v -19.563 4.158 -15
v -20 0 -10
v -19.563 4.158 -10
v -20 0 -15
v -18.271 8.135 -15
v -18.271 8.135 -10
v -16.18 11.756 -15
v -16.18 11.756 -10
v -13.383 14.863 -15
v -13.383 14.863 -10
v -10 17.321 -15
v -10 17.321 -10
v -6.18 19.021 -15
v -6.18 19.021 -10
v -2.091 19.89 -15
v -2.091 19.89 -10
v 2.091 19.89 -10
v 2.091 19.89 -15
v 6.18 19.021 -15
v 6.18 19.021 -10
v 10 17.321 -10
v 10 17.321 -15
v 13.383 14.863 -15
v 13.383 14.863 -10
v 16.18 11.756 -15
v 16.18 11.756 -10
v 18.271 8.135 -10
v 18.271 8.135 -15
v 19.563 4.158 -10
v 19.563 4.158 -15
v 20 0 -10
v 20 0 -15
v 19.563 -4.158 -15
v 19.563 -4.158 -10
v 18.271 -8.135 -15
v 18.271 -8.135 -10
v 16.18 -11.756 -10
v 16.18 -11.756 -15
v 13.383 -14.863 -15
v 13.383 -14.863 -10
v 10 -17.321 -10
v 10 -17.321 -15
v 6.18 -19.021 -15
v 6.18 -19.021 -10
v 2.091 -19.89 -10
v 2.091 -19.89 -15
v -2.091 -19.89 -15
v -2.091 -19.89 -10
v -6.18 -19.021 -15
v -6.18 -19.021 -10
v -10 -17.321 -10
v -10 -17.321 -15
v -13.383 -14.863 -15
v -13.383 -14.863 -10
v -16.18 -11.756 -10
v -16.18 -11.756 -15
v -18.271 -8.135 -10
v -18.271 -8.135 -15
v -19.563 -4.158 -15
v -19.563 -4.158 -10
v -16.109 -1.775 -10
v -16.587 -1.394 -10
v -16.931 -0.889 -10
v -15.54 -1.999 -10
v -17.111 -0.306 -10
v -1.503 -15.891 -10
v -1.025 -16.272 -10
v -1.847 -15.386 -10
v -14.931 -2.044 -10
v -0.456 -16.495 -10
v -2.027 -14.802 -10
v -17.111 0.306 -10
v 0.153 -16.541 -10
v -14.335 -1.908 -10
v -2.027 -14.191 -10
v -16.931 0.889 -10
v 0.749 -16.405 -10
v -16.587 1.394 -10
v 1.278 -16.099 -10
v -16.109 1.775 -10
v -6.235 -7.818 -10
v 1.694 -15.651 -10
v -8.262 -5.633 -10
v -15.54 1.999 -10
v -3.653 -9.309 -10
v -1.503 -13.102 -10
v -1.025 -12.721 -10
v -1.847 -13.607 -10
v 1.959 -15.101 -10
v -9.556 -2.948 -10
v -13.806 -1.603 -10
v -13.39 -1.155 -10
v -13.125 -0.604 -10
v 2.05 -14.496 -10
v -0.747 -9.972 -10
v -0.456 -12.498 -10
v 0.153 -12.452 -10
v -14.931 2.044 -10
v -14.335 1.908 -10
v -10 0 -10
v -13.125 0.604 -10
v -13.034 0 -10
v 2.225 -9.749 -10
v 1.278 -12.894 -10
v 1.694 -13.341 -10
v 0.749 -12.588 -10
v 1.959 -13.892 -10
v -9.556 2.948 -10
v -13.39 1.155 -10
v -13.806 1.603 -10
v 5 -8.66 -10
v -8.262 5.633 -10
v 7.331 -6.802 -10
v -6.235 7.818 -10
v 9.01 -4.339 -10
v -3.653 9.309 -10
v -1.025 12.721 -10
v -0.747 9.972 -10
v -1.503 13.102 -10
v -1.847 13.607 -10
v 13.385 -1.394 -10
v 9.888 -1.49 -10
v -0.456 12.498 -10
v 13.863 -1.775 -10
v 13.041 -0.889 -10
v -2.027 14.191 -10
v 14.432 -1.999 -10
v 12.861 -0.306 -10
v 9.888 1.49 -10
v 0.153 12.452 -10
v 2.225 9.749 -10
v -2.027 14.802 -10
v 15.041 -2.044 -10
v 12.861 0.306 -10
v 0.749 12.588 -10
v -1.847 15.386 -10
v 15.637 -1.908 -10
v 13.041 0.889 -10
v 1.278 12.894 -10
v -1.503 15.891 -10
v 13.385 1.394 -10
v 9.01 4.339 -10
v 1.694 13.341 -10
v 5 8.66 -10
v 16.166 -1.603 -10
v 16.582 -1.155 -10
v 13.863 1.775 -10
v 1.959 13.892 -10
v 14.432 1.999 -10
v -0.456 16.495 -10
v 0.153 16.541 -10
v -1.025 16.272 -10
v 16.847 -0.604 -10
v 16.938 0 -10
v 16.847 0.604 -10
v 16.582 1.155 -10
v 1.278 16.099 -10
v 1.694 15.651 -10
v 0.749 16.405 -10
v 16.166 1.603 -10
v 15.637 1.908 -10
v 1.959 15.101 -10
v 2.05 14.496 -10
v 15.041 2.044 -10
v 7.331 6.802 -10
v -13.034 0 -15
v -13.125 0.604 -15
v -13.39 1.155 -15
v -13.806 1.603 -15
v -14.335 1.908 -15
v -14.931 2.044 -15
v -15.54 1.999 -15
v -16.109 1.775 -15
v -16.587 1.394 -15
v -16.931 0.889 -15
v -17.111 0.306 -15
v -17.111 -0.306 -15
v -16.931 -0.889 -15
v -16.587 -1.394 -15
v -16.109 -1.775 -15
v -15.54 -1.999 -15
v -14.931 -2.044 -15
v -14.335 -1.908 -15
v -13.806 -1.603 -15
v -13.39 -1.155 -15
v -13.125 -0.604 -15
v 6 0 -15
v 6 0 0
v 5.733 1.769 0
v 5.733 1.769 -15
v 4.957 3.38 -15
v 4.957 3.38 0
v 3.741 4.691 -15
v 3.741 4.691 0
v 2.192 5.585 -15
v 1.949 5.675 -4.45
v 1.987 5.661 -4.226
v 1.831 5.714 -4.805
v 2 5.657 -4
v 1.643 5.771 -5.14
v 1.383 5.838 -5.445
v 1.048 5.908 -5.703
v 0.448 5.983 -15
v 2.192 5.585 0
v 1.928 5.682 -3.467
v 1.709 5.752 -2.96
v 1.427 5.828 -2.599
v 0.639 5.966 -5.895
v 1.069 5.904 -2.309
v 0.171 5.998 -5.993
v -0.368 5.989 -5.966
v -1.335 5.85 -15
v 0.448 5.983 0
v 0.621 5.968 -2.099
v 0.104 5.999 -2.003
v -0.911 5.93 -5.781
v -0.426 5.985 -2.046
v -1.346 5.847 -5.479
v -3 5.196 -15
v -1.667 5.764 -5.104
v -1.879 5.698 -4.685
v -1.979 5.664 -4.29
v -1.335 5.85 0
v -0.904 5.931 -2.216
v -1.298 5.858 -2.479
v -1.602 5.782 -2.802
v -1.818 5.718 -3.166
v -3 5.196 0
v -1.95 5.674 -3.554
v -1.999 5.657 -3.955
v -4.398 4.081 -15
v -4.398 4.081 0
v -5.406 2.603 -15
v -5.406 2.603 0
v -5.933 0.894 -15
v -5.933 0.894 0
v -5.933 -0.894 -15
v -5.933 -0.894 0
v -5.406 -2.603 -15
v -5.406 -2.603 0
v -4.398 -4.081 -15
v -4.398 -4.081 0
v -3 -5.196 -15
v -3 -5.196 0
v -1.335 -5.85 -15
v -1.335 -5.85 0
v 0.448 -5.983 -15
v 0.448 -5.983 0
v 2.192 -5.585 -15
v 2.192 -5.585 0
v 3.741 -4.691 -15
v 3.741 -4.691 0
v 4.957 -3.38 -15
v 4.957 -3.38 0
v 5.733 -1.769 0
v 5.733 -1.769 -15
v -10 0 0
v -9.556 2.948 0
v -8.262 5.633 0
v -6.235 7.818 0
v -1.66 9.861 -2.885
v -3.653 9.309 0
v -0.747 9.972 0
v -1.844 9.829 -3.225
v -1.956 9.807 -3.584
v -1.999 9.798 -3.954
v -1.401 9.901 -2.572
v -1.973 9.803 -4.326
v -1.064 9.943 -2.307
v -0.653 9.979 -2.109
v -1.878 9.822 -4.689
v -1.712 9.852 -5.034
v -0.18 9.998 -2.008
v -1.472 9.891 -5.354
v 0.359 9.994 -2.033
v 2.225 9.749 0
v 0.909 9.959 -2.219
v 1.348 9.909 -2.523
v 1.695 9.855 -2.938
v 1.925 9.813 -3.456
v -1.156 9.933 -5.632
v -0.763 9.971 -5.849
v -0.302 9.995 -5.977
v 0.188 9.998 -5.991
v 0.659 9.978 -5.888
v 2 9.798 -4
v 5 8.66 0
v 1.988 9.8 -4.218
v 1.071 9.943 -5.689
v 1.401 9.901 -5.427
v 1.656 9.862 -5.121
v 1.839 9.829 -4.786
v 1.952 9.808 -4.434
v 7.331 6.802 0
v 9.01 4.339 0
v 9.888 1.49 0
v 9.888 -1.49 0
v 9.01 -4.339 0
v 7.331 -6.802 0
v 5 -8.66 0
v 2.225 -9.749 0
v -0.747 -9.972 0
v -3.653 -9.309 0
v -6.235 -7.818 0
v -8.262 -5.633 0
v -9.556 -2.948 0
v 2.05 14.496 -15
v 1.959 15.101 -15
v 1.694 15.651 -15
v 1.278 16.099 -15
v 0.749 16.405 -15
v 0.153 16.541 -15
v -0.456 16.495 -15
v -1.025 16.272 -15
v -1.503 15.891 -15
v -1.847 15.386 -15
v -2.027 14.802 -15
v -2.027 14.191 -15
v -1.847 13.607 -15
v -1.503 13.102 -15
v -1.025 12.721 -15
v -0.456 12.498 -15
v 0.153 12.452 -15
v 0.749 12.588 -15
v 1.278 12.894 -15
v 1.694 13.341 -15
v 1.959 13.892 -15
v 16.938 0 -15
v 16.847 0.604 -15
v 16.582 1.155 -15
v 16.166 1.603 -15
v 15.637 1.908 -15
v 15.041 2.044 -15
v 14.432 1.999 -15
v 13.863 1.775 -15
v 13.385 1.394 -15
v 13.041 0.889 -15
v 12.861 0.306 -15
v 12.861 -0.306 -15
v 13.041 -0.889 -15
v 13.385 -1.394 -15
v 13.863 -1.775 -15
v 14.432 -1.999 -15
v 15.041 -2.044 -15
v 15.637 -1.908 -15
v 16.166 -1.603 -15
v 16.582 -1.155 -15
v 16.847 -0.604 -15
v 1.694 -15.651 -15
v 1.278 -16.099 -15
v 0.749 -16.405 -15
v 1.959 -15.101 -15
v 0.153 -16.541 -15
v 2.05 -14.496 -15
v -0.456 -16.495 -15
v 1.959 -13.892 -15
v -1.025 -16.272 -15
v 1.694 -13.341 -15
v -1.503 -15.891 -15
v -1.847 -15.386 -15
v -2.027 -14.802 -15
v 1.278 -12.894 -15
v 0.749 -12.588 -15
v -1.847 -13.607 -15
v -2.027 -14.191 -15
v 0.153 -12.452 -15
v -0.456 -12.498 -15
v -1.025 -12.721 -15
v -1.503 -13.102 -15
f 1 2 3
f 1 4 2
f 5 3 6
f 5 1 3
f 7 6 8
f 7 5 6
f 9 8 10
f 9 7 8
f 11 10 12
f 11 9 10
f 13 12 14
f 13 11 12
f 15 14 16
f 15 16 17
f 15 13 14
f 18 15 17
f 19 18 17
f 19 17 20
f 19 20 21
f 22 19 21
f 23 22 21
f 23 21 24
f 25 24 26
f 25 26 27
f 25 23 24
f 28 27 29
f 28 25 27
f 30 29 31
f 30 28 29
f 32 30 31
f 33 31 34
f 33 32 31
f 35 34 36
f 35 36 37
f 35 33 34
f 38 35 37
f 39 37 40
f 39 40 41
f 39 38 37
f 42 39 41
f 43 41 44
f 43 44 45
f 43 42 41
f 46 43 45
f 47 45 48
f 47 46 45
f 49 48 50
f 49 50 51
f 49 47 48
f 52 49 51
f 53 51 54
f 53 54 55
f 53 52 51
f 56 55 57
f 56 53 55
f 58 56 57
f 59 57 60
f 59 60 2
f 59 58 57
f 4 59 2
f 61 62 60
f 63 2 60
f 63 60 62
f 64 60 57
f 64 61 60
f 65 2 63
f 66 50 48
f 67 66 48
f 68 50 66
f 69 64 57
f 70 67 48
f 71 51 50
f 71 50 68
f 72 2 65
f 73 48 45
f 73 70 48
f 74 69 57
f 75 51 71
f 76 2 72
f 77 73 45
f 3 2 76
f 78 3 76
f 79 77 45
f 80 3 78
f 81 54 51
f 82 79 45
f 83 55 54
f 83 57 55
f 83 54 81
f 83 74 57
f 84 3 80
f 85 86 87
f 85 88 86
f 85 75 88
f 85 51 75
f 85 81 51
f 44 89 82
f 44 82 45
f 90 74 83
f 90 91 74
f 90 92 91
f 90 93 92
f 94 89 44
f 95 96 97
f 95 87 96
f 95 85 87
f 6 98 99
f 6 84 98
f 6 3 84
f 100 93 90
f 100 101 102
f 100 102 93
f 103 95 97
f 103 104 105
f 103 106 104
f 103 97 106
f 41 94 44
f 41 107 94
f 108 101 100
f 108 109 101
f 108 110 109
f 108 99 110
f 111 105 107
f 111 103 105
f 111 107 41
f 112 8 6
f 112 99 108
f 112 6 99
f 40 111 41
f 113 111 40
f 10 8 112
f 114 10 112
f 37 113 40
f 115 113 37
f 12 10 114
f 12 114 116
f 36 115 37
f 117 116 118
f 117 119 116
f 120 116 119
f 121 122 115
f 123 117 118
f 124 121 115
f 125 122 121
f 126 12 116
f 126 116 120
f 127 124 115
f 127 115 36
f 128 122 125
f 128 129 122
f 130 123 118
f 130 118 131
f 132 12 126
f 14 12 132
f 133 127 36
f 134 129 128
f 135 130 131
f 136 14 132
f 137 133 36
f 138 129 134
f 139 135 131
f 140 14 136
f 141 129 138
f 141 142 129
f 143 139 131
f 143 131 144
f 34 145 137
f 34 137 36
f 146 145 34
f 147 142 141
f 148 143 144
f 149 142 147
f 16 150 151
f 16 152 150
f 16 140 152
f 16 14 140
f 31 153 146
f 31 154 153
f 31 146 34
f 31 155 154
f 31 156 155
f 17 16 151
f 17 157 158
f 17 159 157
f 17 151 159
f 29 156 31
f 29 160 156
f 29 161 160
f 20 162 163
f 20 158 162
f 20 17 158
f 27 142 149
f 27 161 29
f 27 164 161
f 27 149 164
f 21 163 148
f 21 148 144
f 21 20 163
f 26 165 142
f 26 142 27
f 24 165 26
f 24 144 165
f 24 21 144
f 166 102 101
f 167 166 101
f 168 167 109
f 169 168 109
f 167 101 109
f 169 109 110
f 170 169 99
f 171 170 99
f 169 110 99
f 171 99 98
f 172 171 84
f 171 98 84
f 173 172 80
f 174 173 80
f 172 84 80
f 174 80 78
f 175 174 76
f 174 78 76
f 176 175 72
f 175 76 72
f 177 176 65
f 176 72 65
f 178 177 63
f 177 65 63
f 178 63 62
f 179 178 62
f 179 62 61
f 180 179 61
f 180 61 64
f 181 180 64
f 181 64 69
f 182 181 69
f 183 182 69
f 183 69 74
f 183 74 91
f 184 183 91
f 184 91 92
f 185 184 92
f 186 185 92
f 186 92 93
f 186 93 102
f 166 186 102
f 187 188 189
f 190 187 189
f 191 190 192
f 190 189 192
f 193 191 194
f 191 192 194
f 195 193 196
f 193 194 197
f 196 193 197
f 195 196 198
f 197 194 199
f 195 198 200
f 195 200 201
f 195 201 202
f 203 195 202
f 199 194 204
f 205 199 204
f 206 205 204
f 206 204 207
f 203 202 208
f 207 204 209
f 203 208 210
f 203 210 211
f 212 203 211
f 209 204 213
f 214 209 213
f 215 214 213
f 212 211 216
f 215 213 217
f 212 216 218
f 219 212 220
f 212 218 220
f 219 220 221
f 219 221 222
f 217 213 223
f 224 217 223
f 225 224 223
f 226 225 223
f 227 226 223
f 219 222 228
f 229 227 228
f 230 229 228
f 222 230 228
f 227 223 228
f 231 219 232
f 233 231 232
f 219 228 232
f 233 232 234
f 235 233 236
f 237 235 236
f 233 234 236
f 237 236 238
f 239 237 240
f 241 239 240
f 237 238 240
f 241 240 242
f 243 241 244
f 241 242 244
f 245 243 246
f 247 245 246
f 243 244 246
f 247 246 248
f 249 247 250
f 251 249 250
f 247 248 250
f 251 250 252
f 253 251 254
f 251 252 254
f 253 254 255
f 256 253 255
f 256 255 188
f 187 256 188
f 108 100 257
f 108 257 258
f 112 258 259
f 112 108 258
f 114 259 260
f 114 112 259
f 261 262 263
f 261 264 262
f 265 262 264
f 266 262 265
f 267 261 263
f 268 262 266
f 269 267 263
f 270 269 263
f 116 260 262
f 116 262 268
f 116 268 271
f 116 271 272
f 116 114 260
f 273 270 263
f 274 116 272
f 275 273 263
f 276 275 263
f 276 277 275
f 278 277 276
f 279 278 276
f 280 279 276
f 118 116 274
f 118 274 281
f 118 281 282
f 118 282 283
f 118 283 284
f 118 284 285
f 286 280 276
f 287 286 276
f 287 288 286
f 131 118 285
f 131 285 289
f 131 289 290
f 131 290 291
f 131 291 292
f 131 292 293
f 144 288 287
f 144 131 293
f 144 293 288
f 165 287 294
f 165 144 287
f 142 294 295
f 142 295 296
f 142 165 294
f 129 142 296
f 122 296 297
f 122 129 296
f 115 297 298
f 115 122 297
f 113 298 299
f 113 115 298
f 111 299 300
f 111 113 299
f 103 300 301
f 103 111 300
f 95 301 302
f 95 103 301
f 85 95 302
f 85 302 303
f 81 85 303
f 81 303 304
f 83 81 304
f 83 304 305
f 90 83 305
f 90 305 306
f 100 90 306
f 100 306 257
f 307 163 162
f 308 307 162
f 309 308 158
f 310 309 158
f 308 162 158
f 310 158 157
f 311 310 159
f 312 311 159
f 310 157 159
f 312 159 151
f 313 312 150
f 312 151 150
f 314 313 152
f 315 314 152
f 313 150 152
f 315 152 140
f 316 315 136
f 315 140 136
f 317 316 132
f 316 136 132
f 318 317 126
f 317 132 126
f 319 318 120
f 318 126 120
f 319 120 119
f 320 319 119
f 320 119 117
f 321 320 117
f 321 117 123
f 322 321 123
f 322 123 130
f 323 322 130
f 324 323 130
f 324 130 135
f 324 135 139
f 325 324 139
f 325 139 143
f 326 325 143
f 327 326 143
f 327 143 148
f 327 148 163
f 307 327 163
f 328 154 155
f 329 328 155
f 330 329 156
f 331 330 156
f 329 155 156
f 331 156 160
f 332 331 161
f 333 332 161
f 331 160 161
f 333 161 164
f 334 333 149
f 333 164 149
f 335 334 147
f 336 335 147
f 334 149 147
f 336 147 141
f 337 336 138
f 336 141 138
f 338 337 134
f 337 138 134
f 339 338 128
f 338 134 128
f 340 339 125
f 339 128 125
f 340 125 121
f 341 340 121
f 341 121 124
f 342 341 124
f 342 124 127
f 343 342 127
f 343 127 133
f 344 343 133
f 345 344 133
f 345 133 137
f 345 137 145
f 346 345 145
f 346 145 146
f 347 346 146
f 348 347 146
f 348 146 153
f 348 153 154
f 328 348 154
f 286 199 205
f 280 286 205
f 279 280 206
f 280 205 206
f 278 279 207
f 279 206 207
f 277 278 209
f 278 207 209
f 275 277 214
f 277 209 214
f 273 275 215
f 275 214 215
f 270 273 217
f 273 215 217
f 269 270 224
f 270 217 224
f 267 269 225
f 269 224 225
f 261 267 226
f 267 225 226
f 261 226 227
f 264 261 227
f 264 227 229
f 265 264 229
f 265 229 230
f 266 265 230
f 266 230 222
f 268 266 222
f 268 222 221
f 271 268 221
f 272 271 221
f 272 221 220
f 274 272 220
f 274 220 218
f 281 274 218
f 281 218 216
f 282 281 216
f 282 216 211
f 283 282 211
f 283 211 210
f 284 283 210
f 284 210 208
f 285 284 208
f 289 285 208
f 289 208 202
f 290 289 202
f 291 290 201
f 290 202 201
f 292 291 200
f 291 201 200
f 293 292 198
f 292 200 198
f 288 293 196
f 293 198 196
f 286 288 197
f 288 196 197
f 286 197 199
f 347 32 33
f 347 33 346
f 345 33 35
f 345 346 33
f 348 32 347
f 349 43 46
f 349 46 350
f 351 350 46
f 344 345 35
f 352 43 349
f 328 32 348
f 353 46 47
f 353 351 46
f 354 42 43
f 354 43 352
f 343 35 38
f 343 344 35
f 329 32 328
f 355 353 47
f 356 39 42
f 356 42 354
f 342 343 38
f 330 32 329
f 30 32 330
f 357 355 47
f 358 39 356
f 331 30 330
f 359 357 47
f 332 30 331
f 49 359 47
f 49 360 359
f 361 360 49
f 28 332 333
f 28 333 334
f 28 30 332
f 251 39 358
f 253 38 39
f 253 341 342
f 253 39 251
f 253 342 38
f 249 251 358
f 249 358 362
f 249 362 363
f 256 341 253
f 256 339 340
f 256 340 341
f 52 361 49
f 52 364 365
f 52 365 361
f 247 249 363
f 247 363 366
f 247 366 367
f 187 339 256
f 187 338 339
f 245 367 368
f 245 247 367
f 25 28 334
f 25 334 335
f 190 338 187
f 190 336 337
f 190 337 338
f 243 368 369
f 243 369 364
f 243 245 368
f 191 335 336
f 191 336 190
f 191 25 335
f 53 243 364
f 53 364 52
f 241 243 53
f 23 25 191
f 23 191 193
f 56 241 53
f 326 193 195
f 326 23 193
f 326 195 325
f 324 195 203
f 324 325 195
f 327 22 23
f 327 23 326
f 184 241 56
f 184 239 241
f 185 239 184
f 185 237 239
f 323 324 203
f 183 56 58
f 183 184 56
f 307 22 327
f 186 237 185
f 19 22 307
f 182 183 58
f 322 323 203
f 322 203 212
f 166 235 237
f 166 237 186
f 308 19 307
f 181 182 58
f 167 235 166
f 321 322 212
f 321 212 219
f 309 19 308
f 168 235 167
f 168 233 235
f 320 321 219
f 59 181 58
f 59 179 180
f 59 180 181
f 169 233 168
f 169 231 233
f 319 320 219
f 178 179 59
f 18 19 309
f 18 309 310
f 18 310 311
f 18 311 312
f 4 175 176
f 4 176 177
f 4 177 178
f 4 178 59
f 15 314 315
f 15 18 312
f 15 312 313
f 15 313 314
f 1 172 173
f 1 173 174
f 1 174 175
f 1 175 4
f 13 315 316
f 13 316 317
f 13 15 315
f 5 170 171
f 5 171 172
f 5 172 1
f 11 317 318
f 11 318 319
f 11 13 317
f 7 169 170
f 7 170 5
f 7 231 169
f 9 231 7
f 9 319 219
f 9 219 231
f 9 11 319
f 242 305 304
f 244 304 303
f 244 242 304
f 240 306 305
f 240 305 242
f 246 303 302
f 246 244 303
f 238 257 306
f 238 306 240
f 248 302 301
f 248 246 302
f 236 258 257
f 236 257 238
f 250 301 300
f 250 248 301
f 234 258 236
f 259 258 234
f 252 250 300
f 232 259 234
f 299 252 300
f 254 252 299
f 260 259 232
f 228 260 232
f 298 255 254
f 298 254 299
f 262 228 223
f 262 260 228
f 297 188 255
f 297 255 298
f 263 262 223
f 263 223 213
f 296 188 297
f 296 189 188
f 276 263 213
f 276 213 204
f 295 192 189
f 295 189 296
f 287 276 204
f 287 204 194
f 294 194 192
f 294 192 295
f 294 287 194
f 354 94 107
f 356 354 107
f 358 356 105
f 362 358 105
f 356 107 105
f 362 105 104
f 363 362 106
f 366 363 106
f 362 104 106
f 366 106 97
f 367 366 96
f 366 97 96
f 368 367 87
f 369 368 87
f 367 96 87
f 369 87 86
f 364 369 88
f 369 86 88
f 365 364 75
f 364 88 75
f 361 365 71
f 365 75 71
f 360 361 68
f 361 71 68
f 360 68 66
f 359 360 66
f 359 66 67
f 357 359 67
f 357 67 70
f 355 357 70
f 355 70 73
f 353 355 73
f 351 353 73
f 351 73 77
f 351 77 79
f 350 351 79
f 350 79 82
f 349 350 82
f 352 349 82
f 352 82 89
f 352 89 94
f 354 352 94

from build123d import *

# Parameters (mm, degrees)
F2_R     = 6
F3_DEPTH = 45
F4_R     = 2.05
F5_DEPTH = 25
F6_R     = 2
F7_DEPTH = 10


with BuildPart() as f1:
    # F0 (on Front) → F1 (revolve)
    with BuildSketch(Plane.XZ):
        Polygon((0, -15), (0, 0), (-10, 0), (-10, -10), (-20, -10), (-20, -15), align=None)
    revolve(axis=Axis((0, 0, -7.5), (0, 0, -1)))

    # F2 (on face) → F3 (cut)
    with BuildSketch(Plane.XY):
        Circle(F2_R)
    extrude(amount=-F3_DEPTH, mode=Mode.SUBTRACT)

    # F4 (on Top) → F5 (cut)
    with BuildSketch(Plane.XY):
        with Locations((0, 14.49627)):
            Circle(F4_R)
        with Locations((0, -14.49627)):
            Circle(F4_R)
        with Locations((14.88806, 0)):
            Circle(F4_R)
        with Locations((-15.083956, 0)):
            Circle(F4_R)
    extrude(amount=-F5_DEPTH, mode=Mode.SUBTRACT)

    # F6 (on Front) → F7 (cut)
    with BuildSketch(Plane.XZ):
        with Locations((0, -4)):
            Circle(F6_R)
    extrude(amount=-F7_DEPTH, mode=Mode.SUBTRACT)


solid = f1.part
